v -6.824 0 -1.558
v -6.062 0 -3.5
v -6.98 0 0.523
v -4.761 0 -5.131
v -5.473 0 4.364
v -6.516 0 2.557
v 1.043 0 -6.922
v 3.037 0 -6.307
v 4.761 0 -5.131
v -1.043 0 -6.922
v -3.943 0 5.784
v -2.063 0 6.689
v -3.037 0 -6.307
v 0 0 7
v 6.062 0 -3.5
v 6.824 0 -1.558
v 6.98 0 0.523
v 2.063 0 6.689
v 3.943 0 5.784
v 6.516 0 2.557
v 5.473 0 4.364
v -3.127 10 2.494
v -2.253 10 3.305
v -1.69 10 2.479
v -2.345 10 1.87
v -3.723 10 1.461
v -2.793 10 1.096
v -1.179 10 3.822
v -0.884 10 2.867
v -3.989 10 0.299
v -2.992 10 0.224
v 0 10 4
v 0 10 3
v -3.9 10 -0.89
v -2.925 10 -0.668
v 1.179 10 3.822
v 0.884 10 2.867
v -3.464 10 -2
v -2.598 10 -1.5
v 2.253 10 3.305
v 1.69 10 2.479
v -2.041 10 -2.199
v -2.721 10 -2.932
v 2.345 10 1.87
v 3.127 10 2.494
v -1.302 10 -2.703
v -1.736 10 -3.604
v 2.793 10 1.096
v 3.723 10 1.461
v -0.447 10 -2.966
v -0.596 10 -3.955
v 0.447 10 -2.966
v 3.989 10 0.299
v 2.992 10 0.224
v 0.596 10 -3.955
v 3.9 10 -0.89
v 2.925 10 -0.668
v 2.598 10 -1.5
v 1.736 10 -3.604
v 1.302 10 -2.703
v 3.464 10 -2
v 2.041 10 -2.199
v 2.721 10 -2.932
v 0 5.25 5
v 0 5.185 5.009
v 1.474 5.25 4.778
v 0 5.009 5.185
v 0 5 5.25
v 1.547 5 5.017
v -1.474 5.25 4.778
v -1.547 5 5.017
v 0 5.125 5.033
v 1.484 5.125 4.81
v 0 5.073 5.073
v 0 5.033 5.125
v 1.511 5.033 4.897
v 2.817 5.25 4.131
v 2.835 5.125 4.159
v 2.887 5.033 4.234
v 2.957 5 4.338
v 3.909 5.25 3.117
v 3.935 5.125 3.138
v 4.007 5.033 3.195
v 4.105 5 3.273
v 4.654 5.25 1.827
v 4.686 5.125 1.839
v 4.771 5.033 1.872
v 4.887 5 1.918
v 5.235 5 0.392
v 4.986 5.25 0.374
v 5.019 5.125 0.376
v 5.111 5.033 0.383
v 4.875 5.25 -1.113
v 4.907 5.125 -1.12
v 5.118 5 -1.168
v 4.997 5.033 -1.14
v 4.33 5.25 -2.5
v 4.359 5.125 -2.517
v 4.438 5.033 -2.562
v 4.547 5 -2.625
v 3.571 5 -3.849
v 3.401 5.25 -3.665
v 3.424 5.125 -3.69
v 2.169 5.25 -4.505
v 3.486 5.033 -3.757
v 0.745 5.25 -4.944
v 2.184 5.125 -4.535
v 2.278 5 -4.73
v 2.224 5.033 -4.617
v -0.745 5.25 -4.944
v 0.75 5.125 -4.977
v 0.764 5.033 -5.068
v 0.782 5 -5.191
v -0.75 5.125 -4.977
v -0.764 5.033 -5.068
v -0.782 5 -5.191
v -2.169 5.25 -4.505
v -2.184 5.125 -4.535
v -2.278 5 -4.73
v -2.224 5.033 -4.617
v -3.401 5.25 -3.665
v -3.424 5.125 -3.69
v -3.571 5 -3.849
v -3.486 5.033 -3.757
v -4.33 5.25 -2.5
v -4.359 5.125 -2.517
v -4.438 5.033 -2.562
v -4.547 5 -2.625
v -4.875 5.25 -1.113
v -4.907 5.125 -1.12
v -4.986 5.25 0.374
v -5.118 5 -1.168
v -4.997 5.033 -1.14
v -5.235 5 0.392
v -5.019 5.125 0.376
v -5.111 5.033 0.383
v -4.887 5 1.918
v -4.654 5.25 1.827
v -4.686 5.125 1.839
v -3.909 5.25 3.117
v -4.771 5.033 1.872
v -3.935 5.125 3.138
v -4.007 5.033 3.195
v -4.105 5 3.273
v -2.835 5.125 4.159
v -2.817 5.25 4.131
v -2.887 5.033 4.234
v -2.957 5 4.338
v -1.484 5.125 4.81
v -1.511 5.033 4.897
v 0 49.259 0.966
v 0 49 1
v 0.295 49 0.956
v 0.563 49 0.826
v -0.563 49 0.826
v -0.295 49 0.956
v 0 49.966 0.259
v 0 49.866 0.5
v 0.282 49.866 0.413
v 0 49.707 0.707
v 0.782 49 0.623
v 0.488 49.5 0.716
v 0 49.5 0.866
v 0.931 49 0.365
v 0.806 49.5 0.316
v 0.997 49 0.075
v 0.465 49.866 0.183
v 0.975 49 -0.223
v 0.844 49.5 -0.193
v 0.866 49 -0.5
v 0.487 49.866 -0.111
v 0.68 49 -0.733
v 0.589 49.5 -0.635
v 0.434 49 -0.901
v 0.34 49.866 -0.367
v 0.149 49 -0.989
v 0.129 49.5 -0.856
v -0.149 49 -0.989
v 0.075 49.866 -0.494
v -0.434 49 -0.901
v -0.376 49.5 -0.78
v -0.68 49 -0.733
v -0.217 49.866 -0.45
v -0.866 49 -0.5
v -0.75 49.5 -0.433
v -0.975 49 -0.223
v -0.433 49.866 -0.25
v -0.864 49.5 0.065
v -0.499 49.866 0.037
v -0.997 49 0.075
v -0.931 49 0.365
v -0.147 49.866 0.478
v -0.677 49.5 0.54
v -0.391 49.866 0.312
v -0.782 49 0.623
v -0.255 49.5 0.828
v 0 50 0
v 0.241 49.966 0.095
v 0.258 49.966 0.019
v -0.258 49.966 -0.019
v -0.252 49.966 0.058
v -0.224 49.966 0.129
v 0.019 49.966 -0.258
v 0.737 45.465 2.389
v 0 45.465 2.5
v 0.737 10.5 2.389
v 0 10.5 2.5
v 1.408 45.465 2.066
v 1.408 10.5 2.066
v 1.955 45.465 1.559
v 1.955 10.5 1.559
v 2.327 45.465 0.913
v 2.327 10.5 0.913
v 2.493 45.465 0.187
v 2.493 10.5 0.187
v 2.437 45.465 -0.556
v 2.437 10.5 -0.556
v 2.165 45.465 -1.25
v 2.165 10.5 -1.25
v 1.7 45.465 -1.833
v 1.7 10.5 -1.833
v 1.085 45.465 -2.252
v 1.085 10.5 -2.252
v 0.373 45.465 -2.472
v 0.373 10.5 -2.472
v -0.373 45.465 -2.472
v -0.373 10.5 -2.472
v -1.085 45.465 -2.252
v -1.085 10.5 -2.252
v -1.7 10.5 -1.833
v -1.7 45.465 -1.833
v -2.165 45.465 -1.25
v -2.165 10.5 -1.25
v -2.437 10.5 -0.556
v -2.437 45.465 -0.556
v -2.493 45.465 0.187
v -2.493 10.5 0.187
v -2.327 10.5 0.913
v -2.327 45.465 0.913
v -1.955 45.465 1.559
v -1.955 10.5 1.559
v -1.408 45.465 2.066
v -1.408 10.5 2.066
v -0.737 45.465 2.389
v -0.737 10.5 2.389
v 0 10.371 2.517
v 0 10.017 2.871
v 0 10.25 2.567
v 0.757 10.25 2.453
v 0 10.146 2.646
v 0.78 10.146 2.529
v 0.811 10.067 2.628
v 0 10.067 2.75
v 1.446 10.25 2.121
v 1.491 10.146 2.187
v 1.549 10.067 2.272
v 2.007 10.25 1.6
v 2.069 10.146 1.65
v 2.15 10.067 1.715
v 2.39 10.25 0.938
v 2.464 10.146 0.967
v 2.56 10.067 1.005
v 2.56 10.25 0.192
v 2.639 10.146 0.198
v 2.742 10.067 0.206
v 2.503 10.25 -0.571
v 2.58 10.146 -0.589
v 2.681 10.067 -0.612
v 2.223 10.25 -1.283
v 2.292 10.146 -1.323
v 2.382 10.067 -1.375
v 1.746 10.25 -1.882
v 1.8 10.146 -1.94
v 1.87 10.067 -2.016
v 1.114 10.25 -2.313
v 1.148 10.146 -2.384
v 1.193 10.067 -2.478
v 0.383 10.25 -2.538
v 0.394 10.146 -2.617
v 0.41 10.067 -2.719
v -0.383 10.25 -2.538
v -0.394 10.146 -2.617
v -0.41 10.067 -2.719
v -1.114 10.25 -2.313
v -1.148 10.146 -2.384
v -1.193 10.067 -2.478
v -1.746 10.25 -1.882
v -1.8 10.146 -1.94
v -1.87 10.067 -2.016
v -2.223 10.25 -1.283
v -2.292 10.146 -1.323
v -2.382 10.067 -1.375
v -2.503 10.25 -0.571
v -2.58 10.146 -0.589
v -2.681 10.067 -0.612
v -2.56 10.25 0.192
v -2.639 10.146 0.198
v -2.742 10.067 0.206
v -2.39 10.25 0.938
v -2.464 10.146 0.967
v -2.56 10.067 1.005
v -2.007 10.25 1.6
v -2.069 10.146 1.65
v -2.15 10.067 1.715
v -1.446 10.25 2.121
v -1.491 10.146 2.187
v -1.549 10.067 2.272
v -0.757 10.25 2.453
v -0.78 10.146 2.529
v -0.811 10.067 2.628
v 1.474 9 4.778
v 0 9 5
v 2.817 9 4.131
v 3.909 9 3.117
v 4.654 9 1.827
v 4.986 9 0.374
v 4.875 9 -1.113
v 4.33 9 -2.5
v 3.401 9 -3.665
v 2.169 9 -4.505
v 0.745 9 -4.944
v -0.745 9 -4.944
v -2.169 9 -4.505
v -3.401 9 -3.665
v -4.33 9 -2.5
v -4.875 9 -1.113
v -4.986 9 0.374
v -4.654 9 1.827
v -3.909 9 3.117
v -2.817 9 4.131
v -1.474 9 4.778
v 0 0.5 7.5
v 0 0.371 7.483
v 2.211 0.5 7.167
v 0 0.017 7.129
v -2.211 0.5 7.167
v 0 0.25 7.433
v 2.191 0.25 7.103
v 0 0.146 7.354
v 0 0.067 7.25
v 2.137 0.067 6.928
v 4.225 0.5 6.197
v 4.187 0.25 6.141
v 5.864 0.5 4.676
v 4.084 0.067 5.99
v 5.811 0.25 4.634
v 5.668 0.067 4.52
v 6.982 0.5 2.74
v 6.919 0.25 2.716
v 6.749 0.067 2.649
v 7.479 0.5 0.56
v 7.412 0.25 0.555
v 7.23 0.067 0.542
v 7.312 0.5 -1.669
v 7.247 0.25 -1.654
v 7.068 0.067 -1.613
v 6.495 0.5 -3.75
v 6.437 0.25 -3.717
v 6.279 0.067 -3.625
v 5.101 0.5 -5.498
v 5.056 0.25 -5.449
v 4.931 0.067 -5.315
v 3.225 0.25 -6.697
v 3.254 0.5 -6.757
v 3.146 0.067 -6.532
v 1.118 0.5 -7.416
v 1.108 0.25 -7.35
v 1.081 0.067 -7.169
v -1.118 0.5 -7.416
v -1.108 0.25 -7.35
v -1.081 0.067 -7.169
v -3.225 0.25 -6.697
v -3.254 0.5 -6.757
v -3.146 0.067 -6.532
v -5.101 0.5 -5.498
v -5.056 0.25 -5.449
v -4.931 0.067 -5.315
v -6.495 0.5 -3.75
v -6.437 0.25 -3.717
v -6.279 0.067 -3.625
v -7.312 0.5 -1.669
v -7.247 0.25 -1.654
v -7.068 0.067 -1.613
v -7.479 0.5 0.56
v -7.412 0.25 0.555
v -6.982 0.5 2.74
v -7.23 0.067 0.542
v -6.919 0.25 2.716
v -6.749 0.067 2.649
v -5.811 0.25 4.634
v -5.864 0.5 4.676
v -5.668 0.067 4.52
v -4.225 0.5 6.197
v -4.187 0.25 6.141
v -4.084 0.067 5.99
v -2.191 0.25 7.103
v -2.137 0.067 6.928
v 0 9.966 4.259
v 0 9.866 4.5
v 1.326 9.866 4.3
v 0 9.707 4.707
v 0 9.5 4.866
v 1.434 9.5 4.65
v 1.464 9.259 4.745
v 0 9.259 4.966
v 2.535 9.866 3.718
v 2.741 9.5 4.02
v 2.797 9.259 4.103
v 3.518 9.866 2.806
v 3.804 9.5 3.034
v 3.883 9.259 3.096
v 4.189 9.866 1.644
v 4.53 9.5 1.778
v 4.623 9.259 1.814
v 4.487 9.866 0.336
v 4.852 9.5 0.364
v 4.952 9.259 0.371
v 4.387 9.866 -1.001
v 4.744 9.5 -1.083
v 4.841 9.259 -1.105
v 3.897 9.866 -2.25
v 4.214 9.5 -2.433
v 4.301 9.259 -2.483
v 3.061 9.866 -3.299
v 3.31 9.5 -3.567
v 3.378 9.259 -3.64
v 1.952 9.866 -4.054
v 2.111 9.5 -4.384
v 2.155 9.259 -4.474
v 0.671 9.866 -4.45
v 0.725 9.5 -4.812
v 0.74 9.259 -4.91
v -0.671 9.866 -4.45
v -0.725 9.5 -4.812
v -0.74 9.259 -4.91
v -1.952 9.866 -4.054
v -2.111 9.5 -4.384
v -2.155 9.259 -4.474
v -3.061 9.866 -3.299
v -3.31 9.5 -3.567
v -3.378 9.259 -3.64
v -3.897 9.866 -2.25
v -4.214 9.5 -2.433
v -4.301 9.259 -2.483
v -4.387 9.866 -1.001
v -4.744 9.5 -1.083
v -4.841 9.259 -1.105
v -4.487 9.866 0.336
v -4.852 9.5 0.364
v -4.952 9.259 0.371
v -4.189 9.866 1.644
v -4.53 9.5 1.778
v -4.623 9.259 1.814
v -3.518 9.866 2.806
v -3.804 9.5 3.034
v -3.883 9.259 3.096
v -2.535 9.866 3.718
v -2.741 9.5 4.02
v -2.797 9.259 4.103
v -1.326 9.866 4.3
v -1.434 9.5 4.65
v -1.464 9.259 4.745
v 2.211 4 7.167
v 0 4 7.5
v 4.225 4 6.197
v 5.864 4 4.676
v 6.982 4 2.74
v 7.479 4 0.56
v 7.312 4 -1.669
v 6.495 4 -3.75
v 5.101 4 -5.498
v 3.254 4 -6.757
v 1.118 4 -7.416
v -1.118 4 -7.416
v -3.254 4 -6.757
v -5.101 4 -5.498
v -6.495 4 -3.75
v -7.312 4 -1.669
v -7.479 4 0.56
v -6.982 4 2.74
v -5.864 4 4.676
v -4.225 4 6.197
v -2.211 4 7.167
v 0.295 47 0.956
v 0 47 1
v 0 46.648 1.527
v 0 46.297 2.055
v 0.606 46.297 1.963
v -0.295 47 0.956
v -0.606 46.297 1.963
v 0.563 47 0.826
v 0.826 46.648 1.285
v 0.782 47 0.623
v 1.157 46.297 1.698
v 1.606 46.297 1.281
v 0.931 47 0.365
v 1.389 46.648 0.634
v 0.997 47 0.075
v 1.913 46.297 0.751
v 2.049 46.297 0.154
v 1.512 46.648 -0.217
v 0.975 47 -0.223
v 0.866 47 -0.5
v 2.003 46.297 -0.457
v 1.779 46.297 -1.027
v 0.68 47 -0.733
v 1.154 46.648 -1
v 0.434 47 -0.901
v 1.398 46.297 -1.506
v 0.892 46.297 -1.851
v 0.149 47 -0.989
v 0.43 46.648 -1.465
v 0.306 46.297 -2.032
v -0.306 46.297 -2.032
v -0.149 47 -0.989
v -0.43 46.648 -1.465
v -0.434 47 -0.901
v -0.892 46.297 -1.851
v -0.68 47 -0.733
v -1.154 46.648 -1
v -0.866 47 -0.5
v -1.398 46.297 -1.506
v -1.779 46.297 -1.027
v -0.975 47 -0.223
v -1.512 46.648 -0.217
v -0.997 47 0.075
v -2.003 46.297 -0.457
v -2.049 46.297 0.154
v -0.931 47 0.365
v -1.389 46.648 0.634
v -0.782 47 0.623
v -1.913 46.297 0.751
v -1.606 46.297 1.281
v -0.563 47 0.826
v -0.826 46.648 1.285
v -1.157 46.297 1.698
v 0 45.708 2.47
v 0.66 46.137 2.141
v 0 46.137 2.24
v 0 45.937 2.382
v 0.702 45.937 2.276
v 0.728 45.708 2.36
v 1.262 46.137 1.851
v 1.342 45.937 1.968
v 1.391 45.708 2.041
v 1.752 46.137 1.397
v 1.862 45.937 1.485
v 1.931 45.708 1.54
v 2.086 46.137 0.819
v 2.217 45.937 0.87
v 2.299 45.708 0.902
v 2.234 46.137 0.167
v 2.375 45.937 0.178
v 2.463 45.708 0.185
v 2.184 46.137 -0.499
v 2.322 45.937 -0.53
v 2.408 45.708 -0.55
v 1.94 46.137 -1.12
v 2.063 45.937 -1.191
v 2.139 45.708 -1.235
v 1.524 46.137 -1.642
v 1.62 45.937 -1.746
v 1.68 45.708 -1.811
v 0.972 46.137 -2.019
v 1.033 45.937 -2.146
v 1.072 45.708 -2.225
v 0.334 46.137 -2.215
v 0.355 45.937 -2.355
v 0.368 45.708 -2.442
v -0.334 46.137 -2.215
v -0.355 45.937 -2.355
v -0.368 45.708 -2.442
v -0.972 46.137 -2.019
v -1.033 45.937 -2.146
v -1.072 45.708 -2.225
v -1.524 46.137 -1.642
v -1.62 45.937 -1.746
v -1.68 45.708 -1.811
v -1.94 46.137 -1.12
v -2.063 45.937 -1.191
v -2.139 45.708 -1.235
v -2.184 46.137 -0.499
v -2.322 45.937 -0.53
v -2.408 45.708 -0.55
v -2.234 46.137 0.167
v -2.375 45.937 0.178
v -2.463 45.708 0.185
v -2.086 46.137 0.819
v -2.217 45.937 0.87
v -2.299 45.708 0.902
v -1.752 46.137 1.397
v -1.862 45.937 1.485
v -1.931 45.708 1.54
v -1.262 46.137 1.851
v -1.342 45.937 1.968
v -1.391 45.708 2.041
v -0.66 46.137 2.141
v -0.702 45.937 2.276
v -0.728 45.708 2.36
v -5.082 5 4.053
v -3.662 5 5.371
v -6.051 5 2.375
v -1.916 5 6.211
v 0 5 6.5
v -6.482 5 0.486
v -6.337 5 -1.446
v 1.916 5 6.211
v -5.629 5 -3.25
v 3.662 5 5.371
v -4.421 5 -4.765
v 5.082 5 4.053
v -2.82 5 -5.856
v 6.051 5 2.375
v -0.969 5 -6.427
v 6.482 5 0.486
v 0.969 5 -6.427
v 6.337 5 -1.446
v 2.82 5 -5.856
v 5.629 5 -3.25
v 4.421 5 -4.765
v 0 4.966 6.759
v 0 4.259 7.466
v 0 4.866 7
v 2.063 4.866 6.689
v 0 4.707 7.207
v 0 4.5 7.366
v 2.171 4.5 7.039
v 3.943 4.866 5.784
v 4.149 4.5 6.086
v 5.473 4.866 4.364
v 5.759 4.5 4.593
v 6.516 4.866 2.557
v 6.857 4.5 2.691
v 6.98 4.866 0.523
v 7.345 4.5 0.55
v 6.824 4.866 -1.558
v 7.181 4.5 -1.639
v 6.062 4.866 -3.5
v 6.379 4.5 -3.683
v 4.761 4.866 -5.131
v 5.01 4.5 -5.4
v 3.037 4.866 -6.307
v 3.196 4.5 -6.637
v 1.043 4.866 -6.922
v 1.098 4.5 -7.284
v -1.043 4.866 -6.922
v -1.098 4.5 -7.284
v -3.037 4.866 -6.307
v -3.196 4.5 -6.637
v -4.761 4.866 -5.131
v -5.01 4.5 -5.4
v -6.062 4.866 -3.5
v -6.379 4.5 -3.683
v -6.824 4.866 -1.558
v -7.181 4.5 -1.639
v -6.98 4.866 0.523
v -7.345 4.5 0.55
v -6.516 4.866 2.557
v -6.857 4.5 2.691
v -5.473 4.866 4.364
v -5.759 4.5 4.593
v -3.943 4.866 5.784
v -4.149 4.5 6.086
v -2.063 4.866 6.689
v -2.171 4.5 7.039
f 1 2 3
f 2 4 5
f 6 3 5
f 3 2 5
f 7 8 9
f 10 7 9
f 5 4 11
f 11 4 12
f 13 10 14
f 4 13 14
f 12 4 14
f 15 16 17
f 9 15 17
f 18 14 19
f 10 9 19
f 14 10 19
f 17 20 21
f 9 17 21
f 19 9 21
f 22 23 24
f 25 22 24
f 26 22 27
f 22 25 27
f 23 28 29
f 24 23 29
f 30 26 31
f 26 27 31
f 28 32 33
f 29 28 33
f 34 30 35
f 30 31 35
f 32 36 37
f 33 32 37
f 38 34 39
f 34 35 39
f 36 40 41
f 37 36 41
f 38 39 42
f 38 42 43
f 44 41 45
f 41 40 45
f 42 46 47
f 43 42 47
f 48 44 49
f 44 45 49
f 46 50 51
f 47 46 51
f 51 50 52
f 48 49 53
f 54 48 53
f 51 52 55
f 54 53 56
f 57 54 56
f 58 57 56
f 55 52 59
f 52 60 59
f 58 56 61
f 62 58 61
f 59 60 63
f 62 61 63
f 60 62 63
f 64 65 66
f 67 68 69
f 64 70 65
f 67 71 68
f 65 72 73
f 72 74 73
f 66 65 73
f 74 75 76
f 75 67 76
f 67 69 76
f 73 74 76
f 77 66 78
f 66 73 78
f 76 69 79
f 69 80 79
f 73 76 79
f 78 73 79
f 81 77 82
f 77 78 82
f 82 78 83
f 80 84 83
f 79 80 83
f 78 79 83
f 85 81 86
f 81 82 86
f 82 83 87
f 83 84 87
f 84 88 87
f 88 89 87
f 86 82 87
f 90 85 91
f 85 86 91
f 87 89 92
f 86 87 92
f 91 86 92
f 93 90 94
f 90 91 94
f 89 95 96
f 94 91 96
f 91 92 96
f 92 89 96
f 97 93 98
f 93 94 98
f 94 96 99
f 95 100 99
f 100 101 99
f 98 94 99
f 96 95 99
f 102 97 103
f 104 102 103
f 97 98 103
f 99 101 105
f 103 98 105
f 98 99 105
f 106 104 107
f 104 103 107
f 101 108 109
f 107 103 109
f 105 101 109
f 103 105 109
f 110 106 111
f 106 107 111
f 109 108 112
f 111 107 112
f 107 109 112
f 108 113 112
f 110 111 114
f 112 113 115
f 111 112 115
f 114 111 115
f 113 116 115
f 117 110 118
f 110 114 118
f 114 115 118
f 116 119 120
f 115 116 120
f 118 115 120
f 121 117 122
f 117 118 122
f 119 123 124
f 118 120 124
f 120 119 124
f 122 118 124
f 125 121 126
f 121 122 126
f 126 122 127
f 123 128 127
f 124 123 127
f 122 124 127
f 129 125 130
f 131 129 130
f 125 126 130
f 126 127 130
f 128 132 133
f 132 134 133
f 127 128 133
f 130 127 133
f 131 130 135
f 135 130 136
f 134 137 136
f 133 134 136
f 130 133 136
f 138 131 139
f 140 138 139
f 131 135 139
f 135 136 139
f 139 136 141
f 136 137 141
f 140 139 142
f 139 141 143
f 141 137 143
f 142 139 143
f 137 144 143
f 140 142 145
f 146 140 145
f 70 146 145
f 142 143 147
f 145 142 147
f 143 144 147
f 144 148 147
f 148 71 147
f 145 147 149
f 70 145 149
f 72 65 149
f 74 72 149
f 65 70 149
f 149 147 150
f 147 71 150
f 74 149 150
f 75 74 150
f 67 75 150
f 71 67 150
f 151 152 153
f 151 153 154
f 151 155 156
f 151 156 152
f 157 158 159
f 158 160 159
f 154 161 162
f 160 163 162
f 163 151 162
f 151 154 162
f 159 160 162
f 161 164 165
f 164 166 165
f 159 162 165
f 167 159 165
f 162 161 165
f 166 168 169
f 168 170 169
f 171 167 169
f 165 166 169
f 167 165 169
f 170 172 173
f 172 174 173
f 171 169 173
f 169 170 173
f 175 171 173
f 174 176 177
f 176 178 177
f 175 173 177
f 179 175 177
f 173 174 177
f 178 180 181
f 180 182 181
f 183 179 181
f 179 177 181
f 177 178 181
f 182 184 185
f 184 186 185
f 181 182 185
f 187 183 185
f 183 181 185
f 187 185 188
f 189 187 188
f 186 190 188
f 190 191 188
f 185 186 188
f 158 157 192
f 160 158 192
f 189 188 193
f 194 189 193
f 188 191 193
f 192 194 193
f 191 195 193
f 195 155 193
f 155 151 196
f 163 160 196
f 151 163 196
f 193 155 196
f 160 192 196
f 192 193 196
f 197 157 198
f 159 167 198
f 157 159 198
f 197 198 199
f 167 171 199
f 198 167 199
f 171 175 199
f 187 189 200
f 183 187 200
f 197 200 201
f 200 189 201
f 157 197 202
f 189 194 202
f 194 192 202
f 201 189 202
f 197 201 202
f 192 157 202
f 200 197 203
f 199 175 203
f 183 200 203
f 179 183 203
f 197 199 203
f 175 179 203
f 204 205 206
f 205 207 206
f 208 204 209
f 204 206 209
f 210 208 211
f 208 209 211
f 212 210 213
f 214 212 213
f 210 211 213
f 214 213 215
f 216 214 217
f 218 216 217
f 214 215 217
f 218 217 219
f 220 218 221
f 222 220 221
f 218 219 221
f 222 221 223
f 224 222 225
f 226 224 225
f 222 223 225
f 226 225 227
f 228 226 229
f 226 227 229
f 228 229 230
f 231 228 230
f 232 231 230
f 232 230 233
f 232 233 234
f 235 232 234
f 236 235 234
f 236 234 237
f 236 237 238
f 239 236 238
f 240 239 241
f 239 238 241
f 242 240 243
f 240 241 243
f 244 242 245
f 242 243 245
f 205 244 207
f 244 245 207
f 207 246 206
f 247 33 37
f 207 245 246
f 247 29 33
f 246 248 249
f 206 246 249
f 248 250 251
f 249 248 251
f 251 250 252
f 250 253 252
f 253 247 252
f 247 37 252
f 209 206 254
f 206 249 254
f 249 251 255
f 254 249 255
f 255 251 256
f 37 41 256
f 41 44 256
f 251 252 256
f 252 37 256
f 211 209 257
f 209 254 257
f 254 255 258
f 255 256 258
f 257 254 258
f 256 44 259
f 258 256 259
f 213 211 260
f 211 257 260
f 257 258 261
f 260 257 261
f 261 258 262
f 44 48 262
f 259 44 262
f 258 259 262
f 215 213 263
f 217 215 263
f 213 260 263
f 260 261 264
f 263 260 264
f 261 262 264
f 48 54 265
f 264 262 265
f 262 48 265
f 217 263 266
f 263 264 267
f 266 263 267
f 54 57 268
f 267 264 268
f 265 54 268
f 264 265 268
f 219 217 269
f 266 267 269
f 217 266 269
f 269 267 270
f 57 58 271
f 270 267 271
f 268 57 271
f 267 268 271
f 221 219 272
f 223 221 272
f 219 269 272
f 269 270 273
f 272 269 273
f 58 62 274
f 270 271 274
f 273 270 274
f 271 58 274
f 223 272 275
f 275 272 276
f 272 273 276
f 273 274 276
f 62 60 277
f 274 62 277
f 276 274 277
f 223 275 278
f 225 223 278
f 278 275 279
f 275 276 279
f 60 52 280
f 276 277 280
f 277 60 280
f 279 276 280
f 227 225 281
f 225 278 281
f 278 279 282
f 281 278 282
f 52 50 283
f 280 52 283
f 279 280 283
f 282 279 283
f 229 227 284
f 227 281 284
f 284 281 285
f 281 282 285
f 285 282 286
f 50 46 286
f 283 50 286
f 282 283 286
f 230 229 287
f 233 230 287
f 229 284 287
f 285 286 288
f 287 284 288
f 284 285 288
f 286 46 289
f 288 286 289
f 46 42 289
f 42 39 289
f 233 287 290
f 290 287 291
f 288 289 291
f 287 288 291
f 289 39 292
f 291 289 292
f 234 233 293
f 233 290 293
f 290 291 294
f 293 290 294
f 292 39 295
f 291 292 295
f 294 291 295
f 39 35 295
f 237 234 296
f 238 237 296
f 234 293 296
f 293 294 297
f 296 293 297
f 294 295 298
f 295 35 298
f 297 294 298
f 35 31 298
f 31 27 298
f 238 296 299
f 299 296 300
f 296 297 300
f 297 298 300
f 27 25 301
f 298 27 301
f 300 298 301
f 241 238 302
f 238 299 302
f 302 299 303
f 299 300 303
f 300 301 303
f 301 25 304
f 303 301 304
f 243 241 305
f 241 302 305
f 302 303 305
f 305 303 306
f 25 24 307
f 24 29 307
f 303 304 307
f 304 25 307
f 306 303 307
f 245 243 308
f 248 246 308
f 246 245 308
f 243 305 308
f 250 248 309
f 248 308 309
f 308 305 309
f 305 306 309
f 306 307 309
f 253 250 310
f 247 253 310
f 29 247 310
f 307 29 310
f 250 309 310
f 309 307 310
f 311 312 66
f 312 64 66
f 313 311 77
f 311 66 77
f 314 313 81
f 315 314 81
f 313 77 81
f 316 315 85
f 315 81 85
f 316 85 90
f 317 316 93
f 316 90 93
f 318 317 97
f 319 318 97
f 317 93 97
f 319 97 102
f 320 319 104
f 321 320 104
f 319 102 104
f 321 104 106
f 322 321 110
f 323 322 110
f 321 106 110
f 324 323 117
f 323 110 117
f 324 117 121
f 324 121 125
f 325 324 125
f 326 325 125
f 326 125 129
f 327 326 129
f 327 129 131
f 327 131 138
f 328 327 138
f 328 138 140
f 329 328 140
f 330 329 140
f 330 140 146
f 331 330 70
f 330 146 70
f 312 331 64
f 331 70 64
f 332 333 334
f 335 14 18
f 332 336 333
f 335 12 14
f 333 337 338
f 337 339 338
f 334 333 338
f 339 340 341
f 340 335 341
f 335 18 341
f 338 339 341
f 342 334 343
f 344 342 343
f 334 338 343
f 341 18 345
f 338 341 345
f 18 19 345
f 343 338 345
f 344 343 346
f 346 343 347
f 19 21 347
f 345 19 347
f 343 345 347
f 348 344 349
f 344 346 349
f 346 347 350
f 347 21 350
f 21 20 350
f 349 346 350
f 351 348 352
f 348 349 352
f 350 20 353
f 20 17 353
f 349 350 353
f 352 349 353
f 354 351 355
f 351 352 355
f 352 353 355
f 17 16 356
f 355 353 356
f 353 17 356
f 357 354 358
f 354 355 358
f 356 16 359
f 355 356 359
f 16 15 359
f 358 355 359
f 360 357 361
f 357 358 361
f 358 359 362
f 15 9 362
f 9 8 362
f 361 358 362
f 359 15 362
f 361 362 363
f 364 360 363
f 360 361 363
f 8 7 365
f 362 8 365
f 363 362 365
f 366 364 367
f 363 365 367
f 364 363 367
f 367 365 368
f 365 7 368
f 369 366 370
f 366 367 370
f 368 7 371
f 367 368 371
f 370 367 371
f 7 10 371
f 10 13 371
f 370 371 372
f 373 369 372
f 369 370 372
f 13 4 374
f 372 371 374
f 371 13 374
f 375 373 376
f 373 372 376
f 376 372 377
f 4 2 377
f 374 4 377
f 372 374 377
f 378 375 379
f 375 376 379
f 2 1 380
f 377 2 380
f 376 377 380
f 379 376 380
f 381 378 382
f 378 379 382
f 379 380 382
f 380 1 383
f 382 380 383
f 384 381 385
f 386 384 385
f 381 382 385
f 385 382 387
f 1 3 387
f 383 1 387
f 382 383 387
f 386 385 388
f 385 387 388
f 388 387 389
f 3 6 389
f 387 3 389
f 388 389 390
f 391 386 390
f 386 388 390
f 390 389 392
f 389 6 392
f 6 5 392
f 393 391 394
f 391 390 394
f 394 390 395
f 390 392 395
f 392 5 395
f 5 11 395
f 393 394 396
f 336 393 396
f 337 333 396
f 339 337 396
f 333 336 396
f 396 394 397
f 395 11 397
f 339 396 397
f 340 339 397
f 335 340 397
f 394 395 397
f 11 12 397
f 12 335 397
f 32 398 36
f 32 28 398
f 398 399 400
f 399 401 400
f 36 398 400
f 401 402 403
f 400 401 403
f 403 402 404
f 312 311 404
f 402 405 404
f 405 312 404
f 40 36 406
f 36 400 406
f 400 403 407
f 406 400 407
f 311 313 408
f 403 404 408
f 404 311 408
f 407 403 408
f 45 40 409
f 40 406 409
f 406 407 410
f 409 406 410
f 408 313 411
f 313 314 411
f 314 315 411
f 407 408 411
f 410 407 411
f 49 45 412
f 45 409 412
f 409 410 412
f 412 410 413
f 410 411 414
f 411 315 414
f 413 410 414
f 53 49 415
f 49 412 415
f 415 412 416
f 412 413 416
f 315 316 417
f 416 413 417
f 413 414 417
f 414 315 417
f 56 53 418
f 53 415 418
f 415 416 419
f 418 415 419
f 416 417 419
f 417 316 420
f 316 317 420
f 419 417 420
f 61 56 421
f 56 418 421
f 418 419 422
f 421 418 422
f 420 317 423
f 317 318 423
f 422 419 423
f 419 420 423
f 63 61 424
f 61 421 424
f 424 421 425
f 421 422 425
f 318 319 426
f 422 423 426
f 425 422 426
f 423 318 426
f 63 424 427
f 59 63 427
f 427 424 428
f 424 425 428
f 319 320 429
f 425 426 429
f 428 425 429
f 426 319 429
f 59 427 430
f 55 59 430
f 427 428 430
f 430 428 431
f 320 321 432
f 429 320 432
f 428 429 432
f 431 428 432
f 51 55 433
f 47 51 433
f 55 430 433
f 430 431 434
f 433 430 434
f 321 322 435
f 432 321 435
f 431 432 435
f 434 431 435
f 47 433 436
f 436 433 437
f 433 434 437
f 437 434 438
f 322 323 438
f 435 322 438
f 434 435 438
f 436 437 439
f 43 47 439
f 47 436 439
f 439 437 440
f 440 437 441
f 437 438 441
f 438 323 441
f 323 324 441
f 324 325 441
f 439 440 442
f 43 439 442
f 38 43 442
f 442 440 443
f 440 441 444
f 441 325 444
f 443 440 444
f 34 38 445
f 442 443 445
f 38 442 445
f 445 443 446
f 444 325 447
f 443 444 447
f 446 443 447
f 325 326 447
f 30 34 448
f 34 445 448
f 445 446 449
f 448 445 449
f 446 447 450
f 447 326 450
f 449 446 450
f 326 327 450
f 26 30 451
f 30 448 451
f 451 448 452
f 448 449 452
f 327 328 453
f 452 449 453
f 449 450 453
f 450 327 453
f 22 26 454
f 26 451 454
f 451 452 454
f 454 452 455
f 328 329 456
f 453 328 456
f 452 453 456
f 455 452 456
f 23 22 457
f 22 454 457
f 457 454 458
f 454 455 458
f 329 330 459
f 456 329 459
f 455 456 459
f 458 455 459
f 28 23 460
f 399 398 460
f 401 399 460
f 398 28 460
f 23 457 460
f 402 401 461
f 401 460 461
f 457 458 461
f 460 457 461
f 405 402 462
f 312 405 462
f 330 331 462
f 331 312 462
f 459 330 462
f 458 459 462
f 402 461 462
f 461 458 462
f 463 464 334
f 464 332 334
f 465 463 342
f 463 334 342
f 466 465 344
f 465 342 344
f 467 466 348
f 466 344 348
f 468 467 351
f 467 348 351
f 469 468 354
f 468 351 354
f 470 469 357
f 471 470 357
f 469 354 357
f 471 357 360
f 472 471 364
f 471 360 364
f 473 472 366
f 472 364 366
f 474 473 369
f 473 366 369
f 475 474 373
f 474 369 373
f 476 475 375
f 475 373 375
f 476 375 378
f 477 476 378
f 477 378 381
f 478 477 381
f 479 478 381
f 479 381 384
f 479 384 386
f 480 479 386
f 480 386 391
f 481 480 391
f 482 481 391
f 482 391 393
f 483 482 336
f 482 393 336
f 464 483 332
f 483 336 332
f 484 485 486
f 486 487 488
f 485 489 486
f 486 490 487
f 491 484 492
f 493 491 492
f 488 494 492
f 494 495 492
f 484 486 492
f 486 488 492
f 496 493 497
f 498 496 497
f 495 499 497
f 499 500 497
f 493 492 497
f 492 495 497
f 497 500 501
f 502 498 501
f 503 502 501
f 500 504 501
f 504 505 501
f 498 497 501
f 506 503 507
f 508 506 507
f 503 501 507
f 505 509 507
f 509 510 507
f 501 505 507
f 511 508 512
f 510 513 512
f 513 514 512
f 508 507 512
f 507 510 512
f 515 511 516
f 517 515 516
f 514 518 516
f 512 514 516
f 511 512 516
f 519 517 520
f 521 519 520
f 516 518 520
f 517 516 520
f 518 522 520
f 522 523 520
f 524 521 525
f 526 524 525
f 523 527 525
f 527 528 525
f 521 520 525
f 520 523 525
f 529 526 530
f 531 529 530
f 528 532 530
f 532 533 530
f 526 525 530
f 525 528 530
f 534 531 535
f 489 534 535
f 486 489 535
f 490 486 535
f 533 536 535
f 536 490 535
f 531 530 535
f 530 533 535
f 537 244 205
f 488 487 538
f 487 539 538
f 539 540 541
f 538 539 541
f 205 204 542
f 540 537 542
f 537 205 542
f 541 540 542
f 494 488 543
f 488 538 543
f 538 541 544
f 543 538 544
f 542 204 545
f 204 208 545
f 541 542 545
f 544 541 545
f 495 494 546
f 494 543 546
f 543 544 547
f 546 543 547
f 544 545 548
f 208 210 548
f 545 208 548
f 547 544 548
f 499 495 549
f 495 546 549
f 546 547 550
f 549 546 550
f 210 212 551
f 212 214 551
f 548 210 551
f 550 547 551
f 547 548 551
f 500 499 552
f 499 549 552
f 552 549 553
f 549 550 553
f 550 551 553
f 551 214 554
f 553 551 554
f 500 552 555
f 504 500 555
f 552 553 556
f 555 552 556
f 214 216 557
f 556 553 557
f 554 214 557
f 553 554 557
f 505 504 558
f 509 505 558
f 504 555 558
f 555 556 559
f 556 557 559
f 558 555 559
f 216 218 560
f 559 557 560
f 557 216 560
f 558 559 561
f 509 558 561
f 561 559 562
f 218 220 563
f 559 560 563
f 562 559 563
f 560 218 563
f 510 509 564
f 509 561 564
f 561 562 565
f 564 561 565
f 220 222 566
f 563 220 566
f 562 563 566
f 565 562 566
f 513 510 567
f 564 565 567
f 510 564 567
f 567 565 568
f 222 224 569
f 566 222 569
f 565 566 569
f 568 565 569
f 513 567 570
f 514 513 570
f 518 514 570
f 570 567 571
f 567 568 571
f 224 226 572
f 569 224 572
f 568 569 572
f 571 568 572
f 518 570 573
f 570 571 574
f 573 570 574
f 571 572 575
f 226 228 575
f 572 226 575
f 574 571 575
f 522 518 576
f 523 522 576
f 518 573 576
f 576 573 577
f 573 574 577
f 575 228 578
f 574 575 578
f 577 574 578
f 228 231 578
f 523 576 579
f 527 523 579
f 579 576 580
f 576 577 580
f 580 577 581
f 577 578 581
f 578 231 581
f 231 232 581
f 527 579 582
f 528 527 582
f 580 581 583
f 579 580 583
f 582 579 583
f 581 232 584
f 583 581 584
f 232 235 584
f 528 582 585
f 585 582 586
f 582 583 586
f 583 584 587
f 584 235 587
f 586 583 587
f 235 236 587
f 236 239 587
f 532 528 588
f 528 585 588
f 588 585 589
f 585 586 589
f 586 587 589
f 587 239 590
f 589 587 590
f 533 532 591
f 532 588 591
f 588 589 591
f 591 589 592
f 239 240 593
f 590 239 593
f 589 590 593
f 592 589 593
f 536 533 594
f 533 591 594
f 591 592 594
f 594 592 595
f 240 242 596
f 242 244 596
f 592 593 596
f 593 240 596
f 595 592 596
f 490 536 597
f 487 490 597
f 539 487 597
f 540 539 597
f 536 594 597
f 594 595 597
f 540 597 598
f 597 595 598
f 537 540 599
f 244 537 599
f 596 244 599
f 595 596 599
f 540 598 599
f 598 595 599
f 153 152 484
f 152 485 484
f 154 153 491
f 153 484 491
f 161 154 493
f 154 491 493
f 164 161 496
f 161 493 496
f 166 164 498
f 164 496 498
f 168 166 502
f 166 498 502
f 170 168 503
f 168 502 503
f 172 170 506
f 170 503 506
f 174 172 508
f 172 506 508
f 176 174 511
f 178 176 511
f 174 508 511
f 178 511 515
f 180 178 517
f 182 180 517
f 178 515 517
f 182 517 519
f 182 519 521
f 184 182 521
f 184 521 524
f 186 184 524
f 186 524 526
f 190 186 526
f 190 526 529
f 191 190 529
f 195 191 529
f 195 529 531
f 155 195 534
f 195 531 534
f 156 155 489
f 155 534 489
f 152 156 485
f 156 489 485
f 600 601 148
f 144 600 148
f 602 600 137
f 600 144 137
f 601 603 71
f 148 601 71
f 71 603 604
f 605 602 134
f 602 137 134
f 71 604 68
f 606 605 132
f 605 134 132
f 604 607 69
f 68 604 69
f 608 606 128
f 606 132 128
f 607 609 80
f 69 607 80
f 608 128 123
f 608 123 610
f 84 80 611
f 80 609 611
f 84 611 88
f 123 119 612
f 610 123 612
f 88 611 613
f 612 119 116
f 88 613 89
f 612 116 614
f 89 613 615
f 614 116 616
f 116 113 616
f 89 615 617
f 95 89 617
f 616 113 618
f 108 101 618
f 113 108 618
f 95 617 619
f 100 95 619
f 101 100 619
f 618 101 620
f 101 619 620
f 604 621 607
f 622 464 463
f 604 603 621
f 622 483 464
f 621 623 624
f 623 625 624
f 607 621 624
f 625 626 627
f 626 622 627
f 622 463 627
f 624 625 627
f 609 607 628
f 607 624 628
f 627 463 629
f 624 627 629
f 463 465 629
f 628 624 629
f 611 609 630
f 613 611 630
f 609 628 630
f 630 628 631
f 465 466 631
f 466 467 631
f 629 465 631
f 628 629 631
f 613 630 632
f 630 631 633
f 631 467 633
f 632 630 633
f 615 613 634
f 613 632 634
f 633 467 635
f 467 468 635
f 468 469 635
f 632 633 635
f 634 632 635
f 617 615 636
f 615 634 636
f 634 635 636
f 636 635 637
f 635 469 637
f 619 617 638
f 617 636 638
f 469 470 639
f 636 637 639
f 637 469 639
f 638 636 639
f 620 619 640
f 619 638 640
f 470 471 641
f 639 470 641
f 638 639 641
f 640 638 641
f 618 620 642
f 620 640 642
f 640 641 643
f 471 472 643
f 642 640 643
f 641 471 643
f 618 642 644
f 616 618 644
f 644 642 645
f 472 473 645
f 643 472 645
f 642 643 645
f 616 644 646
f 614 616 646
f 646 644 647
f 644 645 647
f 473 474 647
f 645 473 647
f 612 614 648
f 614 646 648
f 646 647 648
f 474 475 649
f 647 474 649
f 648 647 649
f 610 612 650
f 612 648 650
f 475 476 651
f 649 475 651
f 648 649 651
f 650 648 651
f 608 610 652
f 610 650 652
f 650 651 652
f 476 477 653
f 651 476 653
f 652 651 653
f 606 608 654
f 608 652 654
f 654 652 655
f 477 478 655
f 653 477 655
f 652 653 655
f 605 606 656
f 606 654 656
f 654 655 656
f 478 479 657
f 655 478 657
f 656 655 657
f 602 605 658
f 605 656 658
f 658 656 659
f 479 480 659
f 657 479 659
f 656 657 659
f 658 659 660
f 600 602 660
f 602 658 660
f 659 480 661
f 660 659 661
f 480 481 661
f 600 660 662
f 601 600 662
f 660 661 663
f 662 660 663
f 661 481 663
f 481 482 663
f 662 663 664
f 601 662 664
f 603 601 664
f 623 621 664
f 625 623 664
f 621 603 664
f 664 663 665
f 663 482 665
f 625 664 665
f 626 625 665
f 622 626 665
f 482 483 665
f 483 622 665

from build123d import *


with BuildPart() as f1:
    # F0 (on Right) → F1 (revolve)
    with BuildSketch(Plane.YZ):
        with BuildLine():
            Line((0, 7), (0, 0))
            Line((0, 0), (50, 0))
            ThreePointArc((50, 0), (49.707107, 0.707107), (49, 1))
            Line((49, 1), (47, 1))
            Line((47, 1), (46.296867, 2.0547))
            ThreePointArc((46.296867, 2.0547), (45.936674, 2.381675), (45.464816, 2.5))
            Line((45.464816, 2.5), (10.5, 2.5))
            ThreePointArc((10.5, 2.5), (10.146447, 2.646447), (10, 3))
            Line((10, 3), (10, 4))
            ThreePointArc((10, 4), (9.707107, 4.707107), (9, 5))
            Line((9, 5), (5.25, 5))
            ThreePointArc((5.25, 5), (5.073223, 5.073223), (5, 5.25))
            Line((5, 5.25), (5, 6.5))
            ThreePointArc((5, 6.5), (4.707107, 7.207107), (4, 7.5))
            Line((4, 7.5), (0.5, 7.5))
            ThreePointArc((0.5, 7.5), (0.146447, 7.353553), (0, 7))
        make_face()
    revolve(axis=Axis((0, 25, 0), (0, 1, 0)))


solid = f1.part
